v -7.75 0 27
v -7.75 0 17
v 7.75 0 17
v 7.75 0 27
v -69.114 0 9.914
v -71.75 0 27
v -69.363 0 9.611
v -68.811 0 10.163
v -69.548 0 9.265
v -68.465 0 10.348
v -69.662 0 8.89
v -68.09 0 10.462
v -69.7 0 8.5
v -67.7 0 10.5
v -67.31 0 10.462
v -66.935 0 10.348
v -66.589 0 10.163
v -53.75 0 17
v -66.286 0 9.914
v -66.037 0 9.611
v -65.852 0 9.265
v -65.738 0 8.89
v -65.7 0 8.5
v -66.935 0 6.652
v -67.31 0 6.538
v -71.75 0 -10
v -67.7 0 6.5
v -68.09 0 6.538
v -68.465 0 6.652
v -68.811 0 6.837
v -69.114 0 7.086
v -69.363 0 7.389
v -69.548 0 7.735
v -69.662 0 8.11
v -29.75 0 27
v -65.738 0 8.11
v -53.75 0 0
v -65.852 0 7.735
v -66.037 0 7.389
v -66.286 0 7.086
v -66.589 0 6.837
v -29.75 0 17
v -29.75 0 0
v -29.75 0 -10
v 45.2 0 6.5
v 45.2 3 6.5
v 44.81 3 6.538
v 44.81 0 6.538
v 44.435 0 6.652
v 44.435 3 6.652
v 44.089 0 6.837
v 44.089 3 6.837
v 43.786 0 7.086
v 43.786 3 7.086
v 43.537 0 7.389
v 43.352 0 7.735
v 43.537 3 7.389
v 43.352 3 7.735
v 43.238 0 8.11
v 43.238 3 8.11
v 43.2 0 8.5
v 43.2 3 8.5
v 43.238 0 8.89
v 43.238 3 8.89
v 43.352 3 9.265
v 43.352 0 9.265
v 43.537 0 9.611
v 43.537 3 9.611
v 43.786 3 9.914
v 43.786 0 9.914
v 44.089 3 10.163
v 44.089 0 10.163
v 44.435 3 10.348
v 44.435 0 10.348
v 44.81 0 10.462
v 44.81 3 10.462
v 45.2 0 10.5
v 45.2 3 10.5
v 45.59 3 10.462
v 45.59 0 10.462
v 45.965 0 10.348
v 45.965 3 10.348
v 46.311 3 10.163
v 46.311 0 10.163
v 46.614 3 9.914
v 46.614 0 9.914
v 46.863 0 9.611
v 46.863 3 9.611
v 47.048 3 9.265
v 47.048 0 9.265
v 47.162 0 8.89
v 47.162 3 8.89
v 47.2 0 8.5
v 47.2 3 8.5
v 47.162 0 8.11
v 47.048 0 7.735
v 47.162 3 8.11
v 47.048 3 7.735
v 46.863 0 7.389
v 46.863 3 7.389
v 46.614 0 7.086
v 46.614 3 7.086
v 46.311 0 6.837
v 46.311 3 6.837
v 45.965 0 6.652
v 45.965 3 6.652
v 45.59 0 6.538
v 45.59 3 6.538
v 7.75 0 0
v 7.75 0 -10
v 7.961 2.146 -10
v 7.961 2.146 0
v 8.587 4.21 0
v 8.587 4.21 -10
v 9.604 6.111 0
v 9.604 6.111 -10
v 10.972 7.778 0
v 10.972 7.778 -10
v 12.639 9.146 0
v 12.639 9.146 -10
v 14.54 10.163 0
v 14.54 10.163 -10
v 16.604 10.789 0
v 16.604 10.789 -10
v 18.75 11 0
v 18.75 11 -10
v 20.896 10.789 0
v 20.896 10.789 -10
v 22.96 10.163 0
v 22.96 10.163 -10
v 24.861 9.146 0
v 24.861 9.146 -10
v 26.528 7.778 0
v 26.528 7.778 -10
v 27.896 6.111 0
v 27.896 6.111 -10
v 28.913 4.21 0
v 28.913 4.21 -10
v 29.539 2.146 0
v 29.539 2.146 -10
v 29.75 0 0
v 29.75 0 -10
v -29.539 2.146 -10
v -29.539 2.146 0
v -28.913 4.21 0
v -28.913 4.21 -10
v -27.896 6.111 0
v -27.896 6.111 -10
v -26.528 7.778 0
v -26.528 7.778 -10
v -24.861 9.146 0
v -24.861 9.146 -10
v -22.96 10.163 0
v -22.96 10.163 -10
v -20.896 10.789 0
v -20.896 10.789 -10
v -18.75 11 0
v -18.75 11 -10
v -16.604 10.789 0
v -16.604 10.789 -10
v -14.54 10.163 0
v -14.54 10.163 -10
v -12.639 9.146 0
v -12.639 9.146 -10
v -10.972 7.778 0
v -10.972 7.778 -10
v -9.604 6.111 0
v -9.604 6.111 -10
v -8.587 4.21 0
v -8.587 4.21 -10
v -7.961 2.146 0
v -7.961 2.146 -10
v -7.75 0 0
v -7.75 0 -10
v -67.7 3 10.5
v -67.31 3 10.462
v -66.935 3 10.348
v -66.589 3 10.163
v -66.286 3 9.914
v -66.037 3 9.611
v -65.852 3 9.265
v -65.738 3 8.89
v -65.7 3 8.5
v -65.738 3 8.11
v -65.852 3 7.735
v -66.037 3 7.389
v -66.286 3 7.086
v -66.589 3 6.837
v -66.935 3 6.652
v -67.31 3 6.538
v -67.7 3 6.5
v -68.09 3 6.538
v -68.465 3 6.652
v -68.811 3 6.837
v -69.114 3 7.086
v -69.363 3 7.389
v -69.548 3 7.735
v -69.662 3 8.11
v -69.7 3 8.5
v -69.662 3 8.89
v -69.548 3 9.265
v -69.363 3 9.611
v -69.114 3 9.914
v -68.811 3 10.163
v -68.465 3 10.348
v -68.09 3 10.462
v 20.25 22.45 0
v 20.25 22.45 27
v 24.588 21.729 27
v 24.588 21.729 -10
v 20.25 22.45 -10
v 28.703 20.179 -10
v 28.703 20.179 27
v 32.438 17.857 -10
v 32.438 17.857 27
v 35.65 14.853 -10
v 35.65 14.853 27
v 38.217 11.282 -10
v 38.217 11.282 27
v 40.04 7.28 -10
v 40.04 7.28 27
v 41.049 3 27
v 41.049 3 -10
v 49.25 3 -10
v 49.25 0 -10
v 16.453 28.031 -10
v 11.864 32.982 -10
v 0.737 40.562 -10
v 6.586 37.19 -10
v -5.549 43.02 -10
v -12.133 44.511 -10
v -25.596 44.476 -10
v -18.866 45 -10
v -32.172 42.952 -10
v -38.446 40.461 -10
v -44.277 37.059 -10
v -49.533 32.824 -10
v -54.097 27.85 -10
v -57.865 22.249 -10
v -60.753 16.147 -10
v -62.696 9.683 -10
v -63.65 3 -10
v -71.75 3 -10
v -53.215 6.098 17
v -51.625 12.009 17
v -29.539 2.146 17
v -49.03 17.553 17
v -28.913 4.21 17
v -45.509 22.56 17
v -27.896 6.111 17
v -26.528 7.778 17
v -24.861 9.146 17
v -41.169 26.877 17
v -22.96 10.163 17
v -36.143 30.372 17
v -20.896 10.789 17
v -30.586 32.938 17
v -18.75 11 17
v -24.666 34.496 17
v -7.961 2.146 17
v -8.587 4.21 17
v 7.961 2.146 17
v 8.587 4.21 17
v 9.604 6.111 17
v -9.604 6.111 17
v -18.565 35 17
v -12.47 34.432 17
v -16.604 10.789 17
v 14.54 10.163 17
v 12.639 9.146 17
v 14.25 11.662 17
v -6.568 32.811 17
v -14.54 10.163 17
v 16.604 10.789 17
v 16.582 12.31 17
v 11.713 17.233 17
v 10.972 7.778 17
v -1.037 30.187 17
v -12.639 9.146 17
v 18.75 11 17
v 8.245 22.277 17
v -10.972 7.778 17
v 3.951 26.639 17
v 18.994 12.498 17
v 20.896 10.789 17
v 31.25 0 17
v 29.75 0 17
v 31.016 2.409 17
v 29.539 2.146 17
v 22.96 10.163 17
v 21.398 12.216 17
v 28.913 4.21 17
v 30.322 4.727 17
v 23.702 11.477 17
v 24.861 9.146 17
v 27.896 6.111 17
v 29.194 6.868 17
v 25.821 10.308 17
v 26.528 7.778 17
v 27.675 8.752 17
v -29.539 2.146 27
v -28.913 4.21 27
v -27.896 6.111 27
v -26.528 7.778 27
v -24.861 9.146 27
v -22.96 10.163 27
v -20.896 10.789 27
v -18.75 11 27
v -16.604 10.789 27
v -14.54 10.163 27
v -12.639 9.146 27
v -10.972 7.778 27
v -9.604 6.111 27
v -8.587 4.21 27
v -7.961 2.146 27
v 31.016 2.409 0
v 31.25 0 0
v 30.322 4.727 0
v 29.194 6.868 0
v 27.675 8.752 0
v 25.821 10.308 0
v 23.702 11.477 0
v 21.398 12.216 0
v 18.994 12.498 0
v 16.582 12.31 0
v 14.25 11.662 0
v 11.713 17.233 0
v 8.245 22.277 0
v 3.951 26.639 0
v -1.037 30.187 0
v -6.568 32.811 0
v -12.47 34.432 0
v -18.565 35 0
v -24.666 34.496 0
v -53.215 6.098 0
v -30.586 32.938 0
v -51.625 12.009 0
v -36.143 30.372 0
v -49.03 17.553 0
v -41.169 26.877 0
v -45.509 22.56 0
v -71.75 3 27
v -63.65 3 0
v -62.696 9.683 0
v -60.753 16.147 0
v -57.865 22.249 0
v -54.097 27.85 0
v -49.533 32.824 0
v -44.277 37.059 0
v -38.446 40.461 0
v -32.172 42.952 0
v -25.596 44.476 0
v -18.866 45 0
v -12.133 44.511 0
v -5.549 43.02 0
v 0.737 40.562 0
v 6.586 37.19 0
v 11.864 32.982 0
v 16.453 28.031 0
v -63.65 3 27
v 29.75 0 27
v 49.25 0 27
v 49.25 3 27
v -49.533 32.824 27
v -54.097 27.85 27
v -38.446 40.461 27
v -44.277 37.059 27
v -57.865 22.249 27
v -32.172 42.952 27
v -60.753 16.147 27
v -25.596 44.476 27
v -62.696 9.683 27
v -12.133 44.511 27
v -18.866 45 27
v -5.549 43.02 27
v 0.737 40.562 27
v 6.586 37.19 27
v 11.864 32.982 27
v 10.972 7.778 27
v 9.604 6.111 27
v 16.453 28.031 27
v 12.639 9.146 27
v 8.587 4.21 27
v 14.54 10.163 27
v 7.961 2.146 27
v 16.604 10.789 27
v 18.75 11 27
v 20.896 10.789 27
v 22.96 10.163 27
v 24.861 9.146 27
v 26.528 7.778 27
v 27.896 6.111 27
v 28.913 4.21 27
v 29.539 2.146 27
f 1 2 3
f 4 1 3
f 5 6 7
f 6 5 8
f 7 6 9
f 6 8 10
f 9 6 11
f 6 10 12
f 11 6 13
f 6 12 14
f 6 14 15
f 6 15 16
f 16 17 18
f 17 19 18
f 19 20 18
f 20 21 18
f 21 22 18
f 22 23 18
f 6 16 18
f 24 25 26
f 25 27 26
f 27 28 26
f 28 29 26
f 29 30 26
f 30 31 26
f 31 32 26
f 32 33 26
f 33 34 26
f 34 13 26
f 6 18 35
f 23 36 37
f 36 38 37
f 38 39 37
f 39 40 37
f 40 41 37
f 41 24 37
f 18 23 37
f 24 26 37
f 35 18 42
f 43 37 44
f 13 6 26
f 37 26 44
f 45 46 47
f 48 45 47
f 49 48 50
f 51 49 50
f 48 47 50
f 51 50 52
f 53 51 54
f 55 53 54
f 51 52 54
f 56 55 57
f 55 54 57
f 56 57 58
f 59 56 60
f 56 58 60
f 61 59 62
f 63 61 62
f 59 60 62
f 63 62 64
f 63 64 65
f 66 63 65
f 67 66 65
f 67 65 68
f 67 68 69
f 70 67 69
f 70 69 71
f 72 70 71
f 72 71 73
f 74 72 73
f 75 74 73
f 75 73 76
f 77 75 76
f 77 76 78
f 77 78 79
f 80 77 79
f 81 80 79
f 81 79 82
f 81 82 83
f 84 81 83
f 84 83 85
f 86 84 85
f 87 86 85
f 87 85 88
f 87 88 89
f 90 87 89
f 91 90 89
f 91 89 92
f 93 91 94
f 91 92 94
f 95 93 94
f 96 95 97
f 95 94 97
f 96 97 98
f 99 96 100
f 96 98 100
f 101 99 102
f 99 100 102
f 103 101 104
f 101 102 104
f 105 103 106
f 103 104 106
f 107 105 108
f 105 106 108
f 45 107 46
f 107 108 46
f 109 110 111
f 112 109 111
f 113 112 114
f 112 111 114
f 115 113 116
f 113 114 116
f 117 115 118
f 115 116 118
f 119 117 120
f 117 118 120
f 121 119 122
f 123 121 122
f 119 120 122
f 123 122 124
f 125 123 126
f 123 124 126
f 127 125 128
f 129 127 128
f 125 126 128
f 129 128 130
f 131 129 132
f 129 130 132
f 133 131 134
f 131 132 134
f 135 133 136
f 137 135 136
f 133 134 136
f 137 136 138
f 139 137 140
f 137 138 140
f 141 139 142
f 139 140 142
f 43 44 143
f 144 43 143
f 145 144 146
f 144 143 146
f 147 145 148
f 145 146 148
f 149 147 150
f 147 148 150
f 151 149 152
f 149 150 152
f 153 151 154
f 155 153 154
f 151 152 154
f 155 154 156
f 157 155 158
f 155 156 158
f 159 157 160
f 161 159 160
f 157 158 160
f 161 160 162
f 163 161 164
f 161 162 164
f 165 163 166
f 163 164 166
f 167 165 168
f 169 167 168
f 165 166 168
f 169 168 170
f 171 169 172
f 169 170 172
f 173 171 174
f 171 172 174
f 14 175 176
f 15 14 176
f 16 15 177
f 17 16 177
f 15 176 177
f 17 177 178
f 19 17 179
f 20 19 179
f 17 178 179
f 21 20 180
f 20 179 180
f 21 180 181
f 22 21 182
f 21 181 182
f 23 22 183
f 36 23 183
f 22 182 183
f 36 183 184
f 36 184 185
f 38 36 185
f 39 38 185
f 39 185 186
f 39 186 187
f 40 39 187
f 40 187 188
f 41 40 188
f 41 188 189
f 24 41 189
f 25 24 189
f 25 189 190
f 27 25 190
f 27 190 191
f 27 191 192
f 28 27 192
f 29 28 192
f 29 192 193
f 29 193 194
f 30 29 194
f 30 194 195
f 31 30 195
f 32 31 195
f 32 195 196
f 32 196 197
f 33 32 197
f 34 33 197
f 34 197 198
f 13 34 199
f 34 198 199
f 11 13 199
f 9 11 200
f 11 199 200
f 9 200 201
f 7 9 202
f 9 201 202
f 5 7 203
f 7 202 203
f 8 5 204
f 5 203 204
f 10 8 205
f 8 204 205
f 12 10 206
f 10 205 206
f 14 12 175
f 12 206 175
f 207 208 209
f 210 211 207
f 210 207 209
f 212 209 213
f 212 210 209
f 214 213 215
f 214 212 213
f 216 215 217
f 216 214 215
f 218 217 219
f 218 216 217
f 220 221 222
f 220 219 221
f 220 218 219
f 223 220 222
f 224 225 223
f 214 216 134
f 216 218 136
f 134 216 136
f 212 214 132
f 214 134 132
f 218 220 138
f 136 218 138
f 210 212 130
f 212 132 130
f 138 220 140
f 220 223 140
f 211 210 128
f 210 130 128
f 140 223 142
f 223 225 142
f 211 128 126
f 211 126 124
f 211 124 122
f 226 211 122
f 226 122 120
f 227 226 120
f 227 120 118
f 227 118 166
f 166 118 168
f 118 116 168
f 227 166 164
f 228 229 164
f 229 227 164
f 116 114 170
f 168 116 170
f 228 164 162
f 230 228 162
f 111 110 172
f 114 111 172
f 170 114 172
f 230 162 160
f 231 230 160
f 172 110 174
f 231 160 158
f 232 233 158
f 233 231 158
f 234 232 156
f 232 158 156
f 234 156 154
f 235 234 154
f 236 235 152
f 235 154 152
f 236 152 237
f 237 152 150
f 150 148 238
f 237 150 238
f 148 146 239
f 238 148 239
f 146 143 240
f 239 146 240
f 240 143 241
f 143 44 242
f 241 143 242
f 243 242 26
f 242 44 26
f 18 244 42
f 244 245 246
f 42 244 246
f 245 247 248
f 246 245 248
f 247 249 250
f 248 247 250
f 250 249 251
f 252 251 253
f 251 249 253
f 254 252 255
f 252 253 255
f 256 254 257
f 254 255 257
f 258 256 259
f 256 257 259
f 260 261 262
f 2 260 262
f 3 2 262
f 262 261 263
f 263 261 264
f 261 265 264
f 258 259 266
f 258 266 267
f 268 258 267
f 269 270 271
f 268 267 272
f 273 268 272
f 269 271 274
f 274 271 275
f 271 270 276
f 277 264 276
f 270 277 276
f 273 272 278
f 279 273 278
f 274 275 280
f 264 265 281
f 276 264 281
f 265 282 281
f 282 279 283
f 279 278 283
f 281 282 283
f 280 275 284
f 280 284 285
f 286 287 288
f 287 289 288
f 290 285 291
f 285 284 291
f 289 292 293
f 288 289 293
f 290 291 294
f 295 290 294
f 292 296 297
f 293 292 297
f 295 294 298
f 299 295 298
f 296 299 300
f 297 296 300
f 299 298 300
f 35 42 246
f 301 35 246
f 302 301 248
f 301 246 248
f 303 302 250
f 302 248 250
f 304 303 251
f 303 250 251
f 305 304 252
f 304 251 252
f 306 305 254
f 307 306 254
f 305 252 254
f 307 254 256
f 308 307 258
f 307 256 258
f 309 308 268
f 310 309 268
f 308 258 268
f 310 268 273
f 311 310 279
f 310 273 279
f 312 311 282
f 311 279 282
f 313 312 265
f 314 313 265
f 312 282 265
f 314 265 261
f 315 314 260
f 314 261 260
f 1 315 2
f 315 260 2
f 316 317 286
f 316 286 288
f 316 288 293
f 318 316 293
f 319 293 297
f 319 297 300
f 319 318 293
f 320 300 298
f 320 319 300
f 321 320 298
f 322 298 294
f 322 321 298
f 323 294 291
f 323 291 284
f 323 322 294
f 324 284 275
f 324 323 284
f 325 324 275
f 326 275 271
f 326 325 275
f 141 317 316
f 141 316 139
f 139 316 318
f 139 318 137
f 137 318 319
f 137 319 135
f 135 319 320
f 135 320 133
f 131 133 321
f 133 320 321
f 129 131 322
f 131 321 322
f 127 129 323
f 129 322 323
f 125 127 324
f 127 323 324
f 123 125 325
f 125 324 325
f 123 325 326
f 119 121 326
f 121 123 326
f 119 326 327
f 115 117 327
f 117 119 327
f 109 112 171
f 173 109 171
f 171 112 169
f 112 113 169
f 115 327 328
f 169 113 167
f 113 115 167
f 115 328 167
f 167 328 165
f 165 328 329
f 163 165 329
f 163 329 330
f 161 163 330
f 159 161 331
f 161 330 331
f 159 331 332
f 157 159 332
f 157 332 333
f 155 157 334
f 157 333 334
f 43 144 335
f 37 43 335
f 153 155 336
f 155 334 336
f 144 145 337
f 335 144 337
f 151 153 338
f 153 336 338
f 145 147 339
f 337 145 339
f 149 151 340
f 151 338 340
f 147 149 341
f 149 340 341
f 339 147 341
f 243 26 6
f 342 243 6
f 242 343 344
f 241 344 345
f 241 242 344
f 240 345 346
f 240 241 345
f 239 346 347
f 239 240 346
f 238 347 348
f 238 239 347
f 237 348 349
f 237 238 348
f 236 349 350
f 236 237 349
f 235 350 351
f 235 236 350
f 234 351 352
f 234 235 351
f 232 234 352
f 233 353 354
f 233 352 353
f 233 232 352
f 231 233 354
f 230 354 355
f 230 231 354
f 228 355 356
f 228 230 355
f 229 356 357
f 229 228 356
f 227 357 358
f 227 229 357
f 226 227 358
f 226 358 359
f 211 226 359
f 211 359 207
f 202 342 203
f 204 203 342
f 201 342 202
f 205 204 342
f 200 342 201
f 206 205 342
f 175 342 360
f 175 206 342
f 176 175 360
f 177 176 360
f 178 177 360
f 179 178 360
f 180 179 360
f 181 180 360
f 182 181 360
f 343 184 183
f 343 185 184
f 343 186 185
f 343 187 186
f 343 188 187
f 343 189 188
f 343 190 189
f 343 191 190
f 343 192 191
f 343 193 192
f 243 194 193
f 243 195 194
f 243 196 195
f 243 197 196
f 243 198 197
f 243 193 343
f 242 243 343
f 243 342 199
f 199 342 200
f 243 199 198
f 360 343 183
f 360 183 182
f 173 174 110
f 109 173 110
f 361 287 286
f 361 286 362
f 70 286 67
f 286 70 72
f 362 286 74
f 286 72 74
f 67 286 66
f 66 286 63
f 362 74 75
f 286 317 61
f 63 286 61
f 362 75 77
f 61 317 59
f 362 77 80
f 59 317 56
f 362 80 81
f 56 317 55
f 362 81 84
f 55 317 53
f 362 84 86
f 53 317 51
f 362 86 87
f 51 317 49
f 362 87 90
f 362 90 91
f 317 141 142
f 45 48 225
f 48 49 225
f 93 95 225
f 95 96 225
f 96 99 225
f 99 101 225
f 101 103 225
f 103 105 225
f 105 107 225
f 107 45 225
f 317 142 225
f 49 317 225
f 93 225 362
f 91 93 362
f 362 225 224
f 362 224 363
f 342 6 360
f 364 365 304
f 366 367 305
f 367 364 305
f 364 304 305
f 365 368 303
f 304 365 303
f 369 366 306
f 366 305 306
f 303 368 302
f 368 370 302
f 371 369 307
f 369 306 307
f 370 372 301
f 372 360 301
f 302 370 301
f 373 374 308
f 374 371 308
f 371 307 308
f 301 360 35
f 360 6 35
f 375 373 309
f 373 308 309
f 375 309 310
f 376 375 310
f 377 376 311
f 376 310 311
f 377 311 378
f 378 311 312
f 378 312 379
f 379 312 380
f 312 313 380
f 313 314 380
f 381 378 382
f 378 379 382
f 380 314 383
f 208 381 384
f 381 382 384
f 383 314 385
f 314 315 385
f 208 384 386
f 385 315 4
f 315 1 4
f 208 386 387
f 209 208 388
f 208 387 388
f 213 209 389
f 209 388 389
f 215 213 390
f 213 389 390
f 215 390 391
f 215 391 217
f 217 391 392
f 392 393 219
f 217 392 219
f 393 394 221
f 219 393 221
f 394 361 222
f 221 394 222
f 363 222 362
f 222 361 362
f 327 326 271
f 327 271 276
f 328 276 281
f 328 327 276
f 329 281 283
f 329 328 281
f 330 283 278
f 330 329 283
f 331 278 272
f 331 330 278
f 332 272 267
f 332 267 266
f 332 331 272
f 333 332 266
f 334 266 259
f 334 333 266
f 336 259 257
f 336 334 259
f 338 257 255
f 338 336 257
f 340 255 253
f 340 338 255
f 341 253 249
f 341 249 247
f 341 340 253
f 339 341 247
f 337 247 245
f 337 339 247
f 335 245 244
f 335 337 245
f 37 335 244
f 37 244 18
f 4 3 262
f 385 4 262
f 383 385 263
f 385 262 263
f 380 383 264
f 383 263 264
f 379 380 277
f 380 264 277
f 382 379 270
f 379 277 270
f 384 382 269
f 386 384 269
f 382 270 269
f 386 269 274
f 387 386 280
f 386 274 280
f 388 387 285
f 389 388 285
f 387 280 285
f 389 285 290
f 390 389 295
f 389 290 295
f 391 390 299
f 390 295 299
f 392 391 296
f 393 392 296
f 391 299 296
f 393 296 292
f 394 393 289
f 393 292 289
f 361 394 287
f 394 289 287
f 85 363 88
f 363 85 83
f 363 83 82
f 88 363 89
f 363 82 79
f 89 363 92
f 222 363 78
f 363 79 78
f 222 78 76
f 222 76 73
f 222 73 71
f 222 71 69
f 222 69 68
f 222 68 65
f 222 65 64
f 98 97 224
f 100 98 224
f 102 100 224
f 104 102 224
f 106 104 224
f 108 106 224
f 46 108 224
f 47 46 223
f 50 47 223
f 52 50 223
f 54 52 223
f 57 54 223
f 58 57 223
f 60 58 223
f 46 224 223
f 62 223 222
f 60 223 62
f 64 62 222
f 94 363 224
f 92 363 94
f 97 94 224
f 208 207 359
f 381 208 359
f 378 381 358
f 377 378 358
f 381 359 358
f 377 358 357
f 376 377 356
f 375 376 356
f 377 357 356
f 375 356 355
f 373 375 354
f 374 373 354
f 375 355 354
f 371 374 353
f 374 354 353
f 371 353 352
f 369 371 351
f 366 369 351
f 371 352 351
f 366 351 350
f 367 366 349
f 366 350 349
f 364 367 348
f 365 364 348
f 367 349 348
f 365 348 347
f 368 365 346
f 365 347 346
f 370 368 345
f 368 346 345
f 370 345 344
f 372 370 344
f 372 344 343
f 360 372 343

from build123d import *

# Parameters (mm, degrees)
BOSS_EXTRUDE2_DEPTH      = 27
SHELL5_DEPTH             = 17
BOSS_EXTRUDE3_START      = 10
BOSS_EXTRUDE3_DEPTH      = 10
SKETCH5_R                = 11
CUT_EXTRUDE2_DEPTH       = 87.360074687
BOSS_EXTRUDE4_DEPTH      = 37
BOSS_EXTRUDE5_DEPTH      = 3
BOSS_EXTRUDE5_DEPTH_BACK = 50
SKETCH10_R               = 2
CUT_EXTRUDE3_DEPTH       = 10
SKETCH11_W               = 121
SKETCH11_H               = 37
CUT_EXTRUDE4_DEPTH       = 92.526294036


# Read off the part's stored shape, not the designer's step: Shell5
with BuildPart() as part:
    # Sketch1 → Boss-Extrude2 (new body)
    with BuildSketch(Plane.XY):
        with BuildLine():
            ThreePointArc((20.25, 22.449944321), (-63.75, 0), (20.25, -22.449944321))
            ThreePointArc((20.25, -22.449944321), (41.25, 0), (20.25, 22.449944321))
        make_face()
    extrude(amount=BOSS_EXTRUDE2_DEPTH)

    # Shell5 outline → Shell5 (cut)
    with BuildSketch(Plane.XY):
        with BuildLine():
            ThreePointArc((14.25, -11.66190379), (31.25, 0), (14.25, 11.66190379))
            ThreePointArc((14.25, 11.66190379), (-53.75, 0), (14.25, -11.66190379))
        make_face()
    extrude(amount=SHELL5_DEPTH, mode=Mode.SUBTRACT)

    # Sketch4 → Boss-Extrude3 (add)
    with BuildSketch(Plane(origin=(0, 0, 0), x_dir=(-1, 0, 0), z_dir=(0, 0, -1)).offset(BOSS_EXTRUDE3_START)):
        with BuildLine():
            ThreePointArc((-20.25, 22.449944321), (-41.25, 0), (-20.25, -22.449944321))
            ThreePointArc((-20.25, -22.449944321), (63.75, 0), (-20.25, 22.449944321))
        make_face()
    extrude(amount=-BOSS_EXTRUDE3_DEPTH)

    # Sketch5 → Cut-Extrude2 (cut, through all)
    with BuildSketch(Plane(origin=(0, 0, -10), x_dir=(-1, 0, 0), z_dir=(0, 0, -1))):
        with Locations((-18.75, 0)):
            Circle(SKETCH5_R)
        with Locations((18.75, 0)):
            Circle(SKETCH5_R)
    extrude(amount=-CUT_EXTRUDE2_DEPTH, mode=Mode.SUBTRACT)

    # Sketch8 → Boss-Extrude4 (add)
    with BuildSketch(Plane(origin=(0, 0, -10), x_dir=(-1, 0, 0), z_dir=(0, 0, -1))):
        with BuildLine():
            Line((-41.25, 0), (-41.25, -50))
            Line((-41.25, -50), (63.75, -50))
            Line((63.75, -50), (63.75, 0))
            ThreePointArc((63.75, 0), (30.368950039, -43.474130239), (-20.25, -22.449944321))
            ThreePointArc((-20.25, -22.449944321), (-35.181676725, -15.370426149), (-41.25, 0))
        make_face()
    extrude(amount=-BOSS_EXTRUDE4_DEPTH)

    # Sketch9 → Boss-Extrude5 (add, two sides: drawn at the far end of the back side and taken through both)
    with BuildSketch(Plane(origin=(0, 0, 0), x_dir=(1, 0, 0), z_dir=(0, 1, 0)).offset(-BOSS_EXTRUDE5_DEPTH_BACK)):
        Polygon((-71.75, -27), (-58.75, -27), (-58.75, -8.5), (-58.75, 10), (-71.75, 10), align=None)
        Polygon((36.25, -8.5), (36.25, 10), (49.25, 10), (49.25, -27), (36.25, -27), align=None)
    extrude(amount=BOSS_EXTRUDE5_DEPTH + BOSS_EXTRUDE5_DEPTH_BACK)

    # Sketch10 → Cut-Extrude3 (cut)
    with BuildSketch(Plane(origin=(0, 3, 0), x_dir=(1, 0, 0), z_dir=(0, 1, 0))):
        with Locations(Location((-67.699944321, -8.5, 0), (0, 0, 270))):
            Circle(SKETCH10_R)
        with Locations(Location((45.199944321, -8.5, 0), (0, 0, 90))):
            Circle(SKETCH10_R)
    extrude(amount=-CUT_EXTRUDE3_DEPTH, mode=Mode.SUBTRACT)

    # Sketch11 → Cut-Extrude4 (cut, through all)
    with BuildSketch(Plane(origin=(0, 0, 0), x_dir=(1, 0, 0), z_dir=(0, 1, 0))):
        with Locations((-11.25, -8.5)):
            Rectangle(SKETCH11_W, SKETCH11_H)
    extrude(amount=-CUT_EXTRUDE4_DEPTH, mode=Mode.SUBTRACT)


solid = part.part
